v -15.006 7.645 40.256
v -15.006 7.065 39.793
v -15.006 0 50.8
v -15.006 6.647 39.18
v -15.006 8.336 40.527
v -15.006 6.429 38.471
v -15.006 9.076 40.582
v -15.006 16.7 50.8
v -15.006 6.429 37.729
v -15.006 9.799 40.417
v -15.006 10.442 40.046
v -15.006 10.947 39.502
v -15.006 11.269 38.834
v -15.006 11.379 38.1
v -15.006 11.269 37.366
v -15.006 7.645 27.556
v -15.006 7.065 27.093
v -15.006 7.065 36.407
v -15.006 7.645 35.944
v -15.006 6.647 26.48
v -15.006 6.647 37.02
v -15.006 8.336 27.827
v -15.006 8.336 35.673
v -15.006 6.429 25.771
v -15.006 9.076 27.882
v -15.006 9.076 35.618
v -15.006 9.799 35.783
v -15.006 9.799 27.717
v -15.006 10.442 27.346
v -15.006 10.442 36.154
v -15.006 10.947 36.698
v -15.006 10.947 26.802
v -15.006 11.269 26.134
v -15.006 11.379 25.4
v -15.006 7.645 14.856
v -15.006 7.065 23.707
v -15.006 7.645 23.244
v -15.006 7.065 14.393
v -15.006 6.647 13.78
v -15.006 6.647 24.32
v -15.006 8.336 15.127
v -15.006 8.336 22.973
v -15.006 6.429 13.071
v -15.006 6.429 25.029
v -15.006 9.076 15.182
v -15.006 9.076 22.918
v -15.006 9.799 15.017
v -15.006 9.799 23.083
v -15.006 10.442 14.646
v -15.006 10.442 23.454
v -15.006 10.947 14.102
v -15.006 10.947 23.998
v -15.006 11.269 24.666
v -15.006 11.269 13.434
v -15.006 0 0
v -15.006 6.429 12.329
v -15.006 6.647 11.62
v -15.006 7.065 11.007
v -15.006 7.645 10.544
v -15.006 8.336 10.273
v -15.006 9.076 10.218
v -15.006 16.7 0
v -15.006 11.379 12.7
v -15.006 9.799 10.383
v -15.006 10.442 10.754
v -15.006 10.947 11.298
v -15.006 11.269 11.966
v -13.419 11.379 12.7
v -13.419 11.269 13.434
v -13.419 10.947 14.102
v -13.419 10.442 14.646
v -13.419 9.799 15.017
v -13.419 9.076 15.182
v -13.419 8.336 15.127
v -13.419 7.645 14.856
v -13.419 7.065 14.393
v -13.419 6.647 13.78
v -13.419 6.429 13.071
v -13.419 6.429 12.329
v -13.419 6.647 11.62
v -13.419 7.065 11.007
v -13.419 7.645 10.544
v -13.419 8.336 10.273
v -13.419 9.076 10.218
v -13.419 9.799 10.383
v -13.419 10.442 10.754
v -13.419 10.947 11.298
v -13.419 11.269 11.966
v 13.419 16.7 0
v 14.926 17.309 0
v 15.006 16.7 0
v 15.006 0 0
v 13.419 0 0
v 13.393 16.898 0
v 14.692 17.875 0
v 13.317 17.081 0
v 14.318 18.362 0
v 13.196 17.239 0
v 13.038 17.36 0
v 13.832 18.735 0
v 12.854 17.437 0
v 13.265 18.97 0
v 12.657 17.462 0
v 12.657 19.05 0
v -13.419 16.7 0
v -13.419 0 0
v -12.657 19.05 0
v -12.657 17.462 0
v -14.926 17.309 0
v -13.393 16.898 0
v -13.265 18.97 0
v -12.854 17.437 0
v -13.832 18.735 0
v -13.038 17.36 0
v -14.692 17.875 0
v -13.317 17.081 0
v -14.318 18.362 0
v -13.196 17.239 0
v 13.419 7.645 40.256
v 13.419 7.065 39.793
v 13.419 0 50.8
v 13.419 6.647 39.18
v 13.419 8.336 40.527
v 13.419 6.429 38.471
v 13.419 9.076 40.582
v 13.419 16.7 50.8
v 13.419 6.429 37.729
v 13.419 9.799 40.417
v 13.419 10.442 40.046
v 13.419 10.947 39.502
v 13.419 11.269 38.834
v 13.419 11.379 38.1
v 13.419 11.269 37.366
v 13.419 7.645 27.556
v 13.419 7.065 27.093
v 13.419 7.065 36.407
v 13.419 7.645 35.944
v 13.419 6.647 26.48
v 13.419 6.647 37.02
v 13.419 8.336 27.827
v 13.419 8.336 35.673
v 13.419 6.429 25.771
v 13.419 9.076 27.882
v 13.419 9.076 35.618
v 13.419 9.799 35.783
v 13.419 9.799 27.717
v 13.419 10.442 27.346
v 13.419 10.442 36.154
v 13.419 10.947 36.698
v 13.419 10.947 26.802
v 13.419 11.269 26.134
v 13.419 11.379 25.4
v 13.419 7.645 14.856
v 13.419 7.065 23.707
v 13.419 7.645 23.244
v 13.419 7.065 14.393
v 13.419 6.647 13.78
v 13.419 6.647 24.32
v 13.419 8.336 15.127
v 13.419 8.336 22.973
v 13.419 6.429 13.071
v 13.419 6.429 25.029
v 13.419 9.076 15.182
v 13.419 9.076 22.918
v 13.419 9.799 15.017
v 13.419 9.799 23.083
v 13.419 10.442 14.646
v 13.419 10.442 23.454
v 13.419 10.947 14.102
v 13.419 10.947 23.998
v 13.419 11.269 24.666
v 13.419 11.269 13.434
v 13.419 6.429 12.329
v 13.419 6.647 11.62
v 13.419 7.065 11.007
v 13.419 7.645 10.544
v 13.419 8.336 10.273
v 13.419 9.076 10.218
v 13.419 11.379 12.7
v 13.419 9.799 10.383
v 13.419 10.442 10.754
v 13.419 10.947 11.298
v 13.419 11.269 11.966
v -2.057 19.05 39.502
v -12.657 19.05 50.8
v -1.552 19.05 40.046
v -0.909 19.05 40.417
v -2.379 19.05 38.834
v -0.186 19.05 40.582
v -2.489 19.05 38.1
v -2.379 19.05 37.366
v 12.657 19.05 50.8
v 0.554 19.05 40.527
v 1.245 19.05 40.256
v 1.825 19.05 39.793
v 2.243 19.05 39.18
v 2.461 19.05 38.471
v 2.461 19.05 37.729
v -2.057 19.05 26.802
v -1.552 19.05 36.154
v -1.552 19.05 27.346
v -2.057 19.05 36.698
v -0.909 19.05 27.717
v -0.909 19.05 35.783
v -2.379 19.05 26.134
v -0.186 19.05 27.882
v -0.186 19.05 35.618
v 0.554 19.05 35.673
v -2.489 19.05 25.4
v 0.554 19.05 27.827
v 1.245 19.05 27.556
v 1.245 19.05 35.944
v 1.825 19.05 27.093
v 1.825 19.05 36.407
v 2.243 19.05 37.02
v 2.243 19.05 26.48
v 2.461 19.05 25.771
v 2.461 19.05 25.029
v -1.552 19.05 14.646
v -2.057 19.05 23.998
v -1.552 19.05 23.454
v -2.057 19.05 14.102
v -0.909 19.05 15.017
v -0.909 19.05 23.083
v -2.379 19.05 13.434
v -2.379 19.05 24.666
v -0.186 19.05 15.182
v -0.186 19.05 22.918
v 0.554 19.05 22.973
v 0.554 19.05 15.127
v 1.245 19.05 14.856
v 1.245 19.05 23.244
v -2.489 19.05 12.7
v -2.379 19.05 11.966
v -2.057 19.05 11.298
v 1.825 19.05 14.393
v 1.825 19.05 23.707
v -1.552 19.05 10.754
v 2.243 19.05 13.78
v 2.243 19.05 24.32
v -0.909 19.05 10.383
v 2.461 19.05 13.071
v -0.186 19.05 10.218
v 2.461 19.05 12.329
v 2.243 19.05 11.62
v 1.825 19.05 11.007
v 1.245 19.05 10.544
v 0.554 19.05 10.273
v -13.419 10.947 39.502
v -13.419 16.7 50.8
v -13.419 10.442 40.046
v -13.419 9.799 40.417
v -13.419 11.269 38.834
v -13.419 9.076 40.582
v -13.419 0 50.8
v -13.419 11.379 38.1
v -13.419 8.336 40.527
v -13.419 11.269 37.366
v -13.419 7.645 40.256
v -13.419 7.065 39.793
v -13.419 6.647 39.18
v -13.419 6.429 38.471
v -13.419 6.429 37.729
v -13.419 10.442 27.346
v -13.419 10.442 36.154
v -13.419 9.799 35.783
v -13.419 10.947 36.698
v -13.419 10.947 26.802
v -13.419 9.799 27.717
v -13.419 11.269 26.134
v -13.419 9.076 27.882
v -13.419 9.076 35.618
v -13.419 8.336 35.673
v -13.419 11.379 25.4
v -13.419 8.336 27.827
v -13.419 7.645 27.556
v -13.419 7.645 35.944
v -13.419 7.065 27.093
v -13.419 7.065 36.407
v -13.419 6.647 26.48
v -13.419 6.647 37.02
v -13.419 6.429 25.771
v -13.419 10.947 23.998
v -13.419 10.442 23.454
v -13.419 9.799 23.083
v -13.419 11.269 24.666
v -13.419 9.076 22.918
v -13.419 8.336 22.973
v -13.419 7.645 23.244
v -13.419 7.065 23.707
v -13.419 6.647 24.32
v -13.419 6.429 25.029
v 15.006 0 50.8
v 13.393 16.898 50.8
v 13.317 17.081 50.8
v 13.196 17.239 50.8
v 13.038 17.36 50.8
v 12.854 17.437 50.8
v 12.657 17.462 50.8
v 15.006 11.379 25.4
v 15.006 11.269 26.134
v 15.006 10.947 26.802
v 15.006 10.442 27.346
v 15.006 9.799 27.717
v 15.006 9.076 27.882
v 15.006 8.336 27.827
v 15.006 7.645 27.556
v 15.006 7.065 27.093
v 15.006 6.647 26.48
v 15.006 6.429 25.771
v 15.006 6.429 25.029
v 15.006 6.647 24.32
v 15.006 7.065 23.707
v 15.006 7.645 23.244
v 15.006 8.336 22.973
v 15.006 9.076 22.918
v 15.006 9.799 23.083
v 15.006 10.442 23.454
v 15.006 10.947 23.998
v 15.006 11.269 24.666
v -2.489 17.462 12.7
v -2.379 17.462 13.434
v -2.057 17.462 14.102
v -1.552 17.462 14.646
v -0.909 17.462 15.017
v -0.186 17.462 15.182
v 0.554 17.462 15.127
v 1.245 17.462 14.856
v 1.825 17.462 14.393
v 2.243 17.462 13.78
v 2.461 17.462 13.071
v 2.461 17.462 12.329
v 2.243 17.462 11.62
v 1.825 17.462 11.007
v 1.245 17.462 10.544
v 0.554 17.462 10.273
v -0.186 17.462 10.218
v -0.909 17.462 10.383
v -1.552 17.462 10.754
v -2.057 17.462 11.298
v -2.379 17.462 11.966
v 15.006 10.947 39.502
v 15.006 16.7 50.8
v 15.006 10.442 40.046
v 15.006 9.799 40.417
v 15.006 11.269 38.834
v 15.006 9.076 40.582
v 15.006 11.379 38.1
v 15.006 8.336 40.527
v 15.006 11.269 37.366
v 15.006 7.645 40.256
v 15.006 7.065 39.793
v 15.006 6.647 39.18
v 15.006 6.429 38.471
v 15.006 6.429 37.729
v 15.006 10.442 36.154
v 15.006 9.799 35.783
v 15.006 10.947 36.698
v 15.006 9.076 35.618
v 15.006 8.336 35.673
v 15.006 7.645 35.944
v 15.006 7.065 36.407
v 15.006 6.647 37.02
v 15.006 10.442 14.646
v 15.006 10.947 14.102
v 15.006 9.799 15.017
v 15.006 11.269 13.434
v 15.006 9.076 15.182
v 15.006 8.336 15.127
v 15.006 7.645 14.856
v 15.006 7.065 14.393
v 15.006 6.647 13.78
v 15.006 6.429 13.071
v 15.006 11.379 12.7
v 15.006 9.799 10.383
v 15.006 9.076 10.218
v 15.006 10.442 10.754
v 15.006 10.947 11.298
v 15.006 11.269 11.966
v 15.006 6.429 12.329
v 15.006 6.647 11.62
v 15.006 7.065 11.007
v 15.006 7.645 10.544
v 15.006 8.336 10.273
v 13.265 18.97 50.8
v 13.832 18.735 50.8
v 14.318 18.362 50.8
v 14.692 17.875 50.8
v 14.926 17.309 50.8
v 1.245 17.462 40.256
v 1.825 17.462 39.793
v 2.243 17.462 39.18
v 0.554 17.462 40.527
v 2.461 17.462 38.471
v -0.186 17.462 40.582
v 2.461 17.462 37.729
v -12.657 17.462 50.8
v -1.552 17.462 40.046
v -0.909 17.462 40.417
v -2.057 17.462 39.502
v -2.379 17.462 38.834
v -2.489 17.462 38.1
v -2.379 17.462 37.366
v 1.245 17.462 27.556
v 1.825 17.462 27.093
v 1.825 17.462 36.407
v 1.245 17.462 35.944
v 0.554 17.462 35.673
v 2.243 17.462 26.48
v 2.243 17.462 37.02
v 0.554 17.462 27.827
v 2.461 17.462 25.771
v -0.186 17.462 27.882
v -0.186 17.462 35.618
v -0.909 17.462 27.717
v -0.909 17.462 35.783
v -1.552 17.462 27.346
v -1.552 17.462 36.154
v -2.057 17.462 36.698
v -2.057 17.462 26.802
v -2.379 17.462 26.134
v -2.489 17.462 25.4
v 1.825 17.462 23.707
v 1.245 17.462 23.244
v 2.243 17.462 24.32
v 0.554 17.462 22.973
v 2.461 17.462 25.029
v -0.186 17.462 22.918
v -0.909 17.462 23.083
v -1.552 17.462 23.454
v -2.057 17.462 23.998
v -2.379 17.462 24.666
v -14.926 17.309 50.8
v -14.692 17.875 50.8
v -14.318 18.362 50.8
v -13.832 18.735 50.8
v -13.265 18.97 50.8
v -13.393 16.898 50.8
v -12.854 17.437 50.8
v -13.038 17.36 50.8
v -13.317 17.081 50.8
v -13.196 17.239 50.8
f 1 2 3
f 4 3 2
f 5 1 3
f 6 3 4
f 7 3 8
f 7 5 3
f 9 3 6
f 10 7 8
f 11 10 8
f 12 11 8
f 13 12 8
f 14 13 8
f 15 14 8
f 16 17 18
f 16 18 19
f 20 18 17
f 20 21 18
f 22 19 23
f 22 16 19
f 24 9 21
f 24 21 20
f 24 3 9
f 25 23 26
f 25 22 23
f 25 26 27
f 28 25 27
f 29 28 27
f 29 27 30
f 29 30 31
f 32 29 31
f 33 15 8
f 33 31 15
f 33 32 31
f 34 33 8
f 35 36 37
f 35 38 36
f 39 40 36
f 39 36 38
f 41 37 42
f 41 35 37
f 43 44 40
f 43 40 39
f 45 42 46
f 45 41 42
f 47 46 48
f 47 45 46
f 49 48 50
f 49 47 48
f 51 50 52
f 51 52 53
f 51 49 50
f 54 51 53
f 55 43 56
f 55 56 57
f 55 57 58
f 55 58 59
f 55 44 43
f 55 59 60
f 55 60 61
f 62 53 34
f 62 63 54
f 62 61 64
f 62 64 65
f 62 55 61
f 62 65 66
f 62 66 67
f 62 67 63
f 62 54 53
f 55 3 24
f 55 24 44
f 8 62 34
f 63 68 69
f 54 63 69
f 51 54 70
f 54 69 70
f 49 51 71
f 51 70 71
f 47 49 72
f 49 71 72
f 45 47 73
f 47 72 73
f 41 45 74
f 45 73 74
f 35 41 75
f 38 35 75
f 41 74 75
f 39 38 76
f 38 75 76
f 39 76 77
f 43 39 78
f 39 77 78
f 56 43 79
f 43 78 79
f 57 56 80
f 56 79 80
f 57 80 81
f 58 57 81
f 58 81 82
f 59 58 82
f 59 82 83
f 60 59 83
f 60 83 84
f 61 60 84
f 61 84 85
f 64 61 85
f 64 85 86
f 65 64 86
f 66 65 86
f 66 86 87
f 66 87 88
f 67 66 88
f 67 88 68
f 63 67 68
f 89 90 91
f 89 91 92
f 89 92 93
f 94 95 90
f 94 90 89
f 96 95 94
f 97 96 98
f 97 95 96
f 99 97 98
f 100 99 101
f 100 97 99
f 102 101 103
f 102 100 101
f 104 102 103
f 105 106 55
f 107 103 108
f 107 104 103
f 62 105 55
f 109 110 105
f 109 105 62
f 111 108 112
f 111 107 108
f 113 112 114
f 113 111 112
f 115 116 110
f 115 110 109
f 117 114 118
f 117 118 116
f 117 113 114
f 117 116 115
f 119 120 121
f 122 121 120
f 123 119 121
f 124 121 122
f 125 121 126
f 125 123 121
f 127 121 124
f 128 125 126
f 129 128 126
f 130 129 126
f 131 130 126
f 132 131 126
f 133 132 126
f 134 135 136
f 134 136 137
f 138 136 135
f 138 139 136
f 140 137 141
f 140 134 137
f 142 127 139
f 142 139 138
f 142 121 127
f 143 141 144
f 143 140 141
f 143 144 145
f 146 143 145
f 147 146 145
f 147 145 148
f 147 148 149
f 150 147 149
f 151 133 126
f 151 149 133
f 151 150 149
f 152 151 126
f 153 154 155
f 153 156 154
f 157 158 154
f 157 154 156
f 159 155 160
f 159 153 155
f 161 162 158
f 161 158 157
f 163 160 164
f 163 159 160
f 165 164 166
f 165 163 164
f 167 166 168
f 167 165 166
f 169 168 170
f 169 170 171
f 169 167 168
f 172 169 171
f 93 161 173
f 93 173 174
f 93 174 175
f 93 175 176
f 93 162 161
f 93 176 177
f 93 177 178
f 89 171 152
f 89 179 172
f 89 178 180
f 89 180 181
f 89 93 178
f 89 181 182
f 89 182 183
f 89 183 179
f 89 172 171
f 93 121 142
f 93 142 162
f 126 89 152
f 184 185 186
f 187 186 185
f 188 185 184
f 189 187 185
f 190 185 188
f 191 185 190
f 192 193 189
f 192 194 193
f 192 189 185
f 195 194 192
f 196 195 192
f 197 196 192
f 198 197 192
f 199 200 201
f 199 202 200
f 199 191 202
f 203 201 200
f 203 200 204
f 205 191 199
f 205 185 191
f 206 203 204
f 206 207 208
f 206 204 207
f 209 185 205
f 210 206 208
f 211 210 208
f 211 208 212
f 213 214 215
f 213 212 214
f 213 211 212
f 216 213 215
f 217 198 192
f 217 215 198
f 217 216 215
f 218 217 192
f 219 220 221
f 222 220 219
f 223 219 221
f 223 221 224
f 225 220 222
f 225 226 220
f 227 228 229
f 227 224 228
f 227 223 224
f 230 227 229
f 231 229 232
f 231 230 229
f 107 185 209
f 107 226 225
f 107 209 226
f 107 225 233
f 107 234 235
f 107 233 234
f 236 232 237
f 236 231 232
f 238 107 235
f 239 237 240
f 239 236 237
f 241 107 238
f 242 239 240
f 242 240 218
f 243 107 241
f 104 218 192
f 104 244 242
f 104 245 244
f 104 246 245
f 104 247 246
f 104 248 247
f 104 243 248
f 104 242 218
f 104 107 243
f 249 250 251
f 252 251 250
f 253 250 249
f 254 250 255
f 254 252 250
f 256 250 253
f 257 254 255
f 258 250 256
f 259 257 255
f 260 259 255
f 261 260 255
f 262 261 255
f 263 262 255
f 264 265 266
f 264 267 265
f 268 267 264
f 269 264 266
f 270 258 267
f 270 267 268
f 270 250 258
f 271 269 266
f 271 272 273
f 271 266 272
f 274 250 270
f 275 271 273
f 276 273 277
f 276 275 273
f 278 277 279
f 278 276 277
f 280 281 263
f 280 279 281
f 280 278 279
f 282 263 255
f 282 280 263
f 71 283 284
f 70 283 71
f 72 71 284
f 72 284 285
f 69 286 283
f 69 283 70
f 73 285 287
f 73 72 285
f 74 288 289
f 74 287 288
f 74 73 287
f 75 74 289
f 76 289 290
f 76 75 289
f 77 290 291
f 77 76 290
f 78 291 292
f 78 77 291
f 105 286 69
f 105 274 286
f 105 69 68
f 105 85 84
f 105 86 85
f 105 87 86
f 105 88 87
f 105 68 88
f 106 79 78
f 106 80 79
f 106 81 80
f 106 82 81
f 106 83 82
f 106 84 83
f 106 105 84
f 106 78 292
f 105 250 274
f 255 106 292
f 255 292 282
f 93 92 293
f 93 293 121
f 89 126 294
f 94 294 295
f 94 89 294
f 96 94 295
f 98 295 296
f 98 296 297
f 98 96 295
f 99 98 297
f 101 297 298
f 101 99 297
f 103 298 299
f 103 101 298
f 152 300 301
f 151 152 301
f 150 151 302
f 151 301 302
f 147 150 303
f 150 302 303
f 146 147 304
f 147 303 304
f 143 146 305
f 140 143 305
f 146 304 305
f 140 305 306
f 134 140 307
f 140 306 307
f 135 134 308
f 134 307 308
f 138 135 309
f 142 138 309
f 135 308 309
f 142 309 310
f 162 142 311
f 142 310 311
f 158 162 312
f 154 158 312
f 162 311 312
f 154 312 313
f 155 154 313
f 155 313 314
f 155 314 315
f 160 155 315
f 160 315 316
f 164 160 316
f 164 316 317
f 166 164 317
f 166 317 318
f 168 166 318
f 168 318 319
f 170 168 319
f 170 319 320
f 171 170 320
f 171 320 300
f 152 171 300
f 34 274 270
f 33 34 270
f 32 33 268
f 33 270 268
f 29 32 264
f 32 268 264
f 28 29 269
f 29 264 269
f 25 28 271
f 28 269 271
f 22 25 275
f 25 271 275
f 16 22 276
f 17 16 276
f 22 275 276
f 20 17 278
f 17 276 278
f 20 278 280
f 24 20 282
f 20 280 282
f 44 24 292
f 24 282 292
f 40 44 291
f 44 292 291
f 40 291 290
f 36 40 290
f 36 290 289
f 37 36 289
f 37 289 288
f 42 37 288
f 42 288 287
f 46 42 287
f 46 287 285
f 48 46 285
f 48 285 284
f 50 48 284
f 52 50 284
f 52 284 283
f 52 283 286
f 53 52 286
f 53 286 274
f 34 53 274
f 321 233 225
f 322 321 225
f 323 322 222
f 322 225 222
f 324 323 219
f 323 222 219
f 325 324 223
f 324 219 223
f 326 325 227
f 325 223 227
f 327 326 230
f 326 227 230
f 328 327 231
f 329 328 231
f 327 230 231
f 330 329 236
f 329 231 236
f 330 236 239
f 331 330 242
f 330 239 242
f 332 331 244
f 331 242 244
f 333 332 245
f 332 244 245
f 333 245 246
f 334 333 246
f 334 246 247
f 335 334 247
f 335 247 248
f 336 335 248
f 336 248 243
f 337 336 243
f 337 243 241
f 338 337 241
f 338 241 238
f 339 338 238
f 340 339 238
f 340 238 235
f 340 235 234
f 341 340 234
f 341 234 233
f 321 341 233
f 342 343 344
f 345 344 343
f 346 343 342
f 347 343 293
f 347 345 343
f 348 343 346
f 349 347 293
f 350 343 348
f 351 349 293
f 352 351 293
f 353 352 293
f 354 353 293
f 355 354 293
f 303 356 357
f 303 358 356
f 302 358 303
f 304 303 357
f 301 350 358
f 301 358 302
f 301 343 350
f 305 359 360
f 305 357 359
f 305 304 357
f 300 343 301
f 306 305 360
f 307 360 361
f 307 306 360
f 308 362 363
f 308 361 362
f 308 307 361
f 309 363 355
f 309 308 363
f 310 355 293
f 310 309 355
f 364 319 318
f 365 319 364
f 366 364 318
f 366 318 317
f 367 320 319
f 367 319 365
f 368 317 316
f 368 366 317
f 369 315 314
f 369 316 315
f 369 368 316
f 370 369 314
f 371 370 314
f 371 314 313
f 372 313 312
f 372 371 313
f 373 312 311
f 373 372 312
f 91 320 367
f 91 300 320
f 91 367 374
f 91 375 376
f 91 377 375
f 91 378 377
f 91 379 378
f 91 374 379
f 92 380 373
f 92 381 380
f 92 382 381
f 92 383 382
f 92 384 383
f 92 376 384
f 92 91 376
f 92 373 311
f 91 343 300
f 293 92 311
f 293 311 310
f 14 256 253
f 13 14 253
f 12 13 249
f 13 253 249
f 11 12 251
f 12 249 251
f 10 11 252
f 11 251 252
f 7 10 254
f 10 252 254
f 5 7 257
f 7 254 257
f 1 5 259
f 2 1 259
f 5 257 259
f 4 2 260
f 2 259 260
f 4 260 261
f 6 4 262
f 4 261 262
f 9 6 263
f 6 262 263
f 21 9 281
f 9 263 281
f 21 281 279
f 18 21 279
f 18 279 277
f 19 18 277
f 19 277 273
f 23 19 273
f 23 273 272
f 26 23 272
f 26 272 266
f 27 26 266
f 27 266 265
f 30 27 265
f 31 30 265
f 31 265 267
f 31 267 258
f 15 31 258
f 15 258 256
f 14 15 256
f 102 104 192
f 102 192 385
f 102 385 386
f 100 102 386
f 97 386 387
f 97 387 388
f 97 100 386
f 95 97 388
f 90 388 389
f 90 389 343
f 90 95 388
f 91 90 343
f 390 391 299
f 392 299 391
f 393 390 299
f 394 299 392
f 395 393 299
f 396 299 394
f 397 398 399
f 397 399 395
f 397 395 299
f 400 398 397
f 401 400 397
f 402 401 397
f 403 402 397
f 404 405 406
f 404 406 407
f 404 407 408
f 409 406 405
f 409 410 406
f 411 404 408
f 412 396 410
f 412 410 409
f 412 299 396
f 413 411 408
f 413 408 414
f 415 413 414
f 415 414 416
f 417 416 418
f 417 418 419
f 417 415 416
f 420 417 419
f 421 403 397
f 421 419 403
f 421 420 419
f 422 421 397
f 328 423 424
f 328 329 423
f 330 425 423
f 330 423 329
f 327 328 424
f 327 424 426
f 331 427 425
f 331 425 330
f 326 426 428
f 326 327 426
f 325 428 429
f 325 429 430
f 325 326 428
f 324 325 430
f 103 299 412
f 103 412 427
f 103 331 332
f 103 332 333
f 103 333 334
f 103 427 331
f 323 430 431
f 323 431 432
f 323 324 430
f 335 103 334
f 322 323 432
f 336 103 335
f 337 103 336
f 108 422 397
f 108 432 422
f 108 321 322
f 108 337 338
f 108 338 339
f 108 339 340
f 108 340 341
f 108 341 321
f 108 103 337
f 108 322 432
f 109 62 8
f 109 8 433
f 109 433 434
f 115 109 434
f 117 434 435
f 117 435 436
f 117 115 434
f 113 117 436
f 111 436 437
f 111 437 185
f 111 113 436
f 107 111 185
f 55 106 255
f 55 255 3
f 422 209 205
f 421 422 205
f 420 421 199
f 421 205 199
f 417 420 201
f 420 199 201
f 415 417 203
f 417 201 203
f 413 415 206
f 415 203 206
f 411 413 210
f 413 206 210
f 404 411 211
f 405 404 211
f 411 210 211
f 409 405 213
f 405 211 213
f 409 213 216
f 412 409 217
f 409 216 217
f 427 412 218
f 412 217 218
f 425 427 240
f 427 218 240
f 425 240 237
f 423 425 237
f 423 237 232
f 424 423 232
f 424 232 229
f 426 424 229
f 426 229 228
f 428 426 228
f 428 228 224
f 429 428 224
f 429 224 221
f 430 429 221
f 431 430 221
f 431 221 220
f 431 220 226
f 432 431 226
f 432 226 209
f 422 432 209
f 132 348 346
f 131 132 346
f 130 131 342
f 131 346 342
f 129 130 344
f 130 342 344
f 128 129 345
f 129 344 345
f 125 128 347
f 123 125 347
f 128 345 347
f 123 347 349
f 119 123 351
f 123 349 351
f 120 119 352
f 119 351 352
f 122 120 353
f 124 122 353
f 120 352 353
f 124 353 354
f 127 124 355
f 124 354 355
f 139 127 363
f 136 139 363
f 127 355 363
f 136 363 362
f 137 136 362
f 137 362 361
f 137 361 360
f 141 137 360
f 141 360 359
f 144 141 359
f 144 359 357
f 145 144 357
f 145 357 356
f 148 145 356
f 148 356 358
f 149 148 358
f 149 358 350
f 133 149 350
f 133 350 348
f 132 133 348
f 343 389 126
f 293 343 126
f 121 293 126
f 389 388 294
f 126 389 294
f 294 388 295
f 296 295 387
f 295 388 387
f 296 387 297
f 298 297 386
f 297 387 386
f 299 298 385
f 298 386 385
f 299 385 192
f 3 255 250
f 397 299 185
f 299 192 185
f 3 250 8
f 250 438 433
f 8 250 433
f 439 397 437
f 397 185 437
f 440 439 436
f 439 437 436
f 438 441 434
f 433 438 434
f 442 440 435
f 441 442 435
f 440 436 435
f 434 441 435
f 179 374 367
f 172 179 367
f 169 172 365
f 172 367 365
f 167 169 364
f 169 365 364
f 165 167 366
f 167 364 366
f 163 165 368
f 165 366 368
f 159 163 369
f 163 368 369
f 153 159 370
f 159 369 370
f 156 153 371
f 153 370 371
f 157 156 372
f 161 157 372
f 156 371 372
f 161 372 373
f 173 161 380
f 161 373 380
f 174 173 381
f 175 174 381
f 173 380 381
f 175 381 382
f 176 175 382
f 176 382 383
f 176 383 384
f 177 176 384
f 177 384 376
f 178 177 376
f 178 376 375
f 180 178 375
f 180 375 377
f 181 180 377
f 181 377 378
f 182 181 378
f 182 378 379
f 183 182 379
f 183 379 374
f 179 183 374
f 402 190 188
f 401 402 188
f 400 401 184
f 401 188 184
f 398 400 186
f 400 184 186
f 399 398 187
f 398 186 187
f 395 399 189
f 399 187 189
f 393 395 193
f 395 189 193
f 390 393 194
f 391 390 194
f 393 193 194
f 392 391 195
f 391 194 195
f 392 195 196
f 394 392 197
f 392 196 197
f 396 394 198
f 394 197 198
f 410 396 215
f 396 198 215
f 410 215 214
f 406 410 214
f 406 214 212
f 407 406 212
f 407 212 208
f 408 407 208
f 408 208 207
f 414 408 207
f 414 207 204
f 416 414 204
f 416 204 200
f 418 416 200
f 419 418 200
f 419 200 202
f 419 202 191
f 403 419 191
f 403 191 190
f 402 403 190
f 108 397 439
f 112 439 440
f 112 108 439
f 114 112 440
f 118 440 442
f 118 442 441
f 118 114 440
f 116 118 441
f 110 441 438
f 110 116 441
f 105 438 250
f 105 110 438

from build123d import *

# Parameters (mm, degrees)
BASE_FLANGE1_DEPTH = 50.8
SKETCH6_R          = 2.4892
CUT_EXTRUDE1_DEPTH = 63.002427854
SKETCH7_R          = 2.4892
CUT_EXTRUDE2_DEPTH = 57.291492607


# Sheet-metal steps are written as plain solids
with BuildPart() as part:
    # Sketch1 → Base-Flange1 (new body)
    with BuildSketch(Plane.XY):
        with BuildLine():
            Line((-15.00632, 0), (-15.00632, 16.7005))
            ThreePointArc((-15.00632, 16.7005), (-14.318167382, 18.361847382), (-12.65682, 19.05))
            Line((-12.65682, 19.05), (12.65682, 19.05))
            ThreePointArc((12.65682, 19.05), (14.318167382, 18.361847382), (15.00632, 16.7005))
            Line((15.00632, 16.7005), (15.00632, 0))
            Line((15.00632, 0), (13.41882, 0))
            Line((13.41882, 0), (13.41882, 16.7005))
            ThreePointArc((13.41882, 16.7005), (13.195635367, 17.239315367), (12.65682, 17.4625))
            Line((12.65682, 17.4625), (-12.65682, 17.4625))
            ThreePointArc((-12.65682, 17.4625), (-13.195635367, 17.239315367), (-13.41882, 16.7005))
            Line((-13.41882, 16.7005), (-13.41882, 0))
            Line((-13.41882, 0), (-15.00632, 0))
        make_face()
    extrude(amount=BASE_FLANGE1_DEPTH)

    # Sketch6 → Cut-Extrude1 (cut, through all)
    with BuildSketch(Plane(origin=(15.00632, 0, 0), x_dir=(0, 0, -1), z_dir=(1, 0, 0))):
        with Locations(Location((-25.4, 8.89, 0), (0, 0, 90))):
            Circle(SKETCH6_R)
        with Locations(Location((-38.1, 8.89, 0), (0, 0, 90))):
            Circle(SKETCH6_R)
        with Locations(Location((-12.7, 8.89, 0), (0, 0, 90))):
            Circle(SKETCH6_R)
    extrude(amount=-CUT_EXTRUDE1_DEPTH, mode=Mode.SUBTRACT)

    # Sketch7 → Cut-Extrude2 (cut, through all)
    with BuildSketch(Plane(origin=(0, 19.05, 0), x_dir=(1, 0, 0), z_dir=(0, 1, 0))):
        with Locations(Location((0, -12.7, 0), (0, 0, 180))):
            Circle(SKETCH7_R)
        with Locations(Location((0, -25.4, 0), (0, 0, 180))):
            Circle(SKETCH7_R)
        with Locations(Location((0, -38.1, 0), (0, 0, 180))):
            Circle(SKETCH7_R)
    extrude(amount=-CUT_EXTRUDE2_DEPTH, mode=Mode.SUBTRACT)


solid = part.part
